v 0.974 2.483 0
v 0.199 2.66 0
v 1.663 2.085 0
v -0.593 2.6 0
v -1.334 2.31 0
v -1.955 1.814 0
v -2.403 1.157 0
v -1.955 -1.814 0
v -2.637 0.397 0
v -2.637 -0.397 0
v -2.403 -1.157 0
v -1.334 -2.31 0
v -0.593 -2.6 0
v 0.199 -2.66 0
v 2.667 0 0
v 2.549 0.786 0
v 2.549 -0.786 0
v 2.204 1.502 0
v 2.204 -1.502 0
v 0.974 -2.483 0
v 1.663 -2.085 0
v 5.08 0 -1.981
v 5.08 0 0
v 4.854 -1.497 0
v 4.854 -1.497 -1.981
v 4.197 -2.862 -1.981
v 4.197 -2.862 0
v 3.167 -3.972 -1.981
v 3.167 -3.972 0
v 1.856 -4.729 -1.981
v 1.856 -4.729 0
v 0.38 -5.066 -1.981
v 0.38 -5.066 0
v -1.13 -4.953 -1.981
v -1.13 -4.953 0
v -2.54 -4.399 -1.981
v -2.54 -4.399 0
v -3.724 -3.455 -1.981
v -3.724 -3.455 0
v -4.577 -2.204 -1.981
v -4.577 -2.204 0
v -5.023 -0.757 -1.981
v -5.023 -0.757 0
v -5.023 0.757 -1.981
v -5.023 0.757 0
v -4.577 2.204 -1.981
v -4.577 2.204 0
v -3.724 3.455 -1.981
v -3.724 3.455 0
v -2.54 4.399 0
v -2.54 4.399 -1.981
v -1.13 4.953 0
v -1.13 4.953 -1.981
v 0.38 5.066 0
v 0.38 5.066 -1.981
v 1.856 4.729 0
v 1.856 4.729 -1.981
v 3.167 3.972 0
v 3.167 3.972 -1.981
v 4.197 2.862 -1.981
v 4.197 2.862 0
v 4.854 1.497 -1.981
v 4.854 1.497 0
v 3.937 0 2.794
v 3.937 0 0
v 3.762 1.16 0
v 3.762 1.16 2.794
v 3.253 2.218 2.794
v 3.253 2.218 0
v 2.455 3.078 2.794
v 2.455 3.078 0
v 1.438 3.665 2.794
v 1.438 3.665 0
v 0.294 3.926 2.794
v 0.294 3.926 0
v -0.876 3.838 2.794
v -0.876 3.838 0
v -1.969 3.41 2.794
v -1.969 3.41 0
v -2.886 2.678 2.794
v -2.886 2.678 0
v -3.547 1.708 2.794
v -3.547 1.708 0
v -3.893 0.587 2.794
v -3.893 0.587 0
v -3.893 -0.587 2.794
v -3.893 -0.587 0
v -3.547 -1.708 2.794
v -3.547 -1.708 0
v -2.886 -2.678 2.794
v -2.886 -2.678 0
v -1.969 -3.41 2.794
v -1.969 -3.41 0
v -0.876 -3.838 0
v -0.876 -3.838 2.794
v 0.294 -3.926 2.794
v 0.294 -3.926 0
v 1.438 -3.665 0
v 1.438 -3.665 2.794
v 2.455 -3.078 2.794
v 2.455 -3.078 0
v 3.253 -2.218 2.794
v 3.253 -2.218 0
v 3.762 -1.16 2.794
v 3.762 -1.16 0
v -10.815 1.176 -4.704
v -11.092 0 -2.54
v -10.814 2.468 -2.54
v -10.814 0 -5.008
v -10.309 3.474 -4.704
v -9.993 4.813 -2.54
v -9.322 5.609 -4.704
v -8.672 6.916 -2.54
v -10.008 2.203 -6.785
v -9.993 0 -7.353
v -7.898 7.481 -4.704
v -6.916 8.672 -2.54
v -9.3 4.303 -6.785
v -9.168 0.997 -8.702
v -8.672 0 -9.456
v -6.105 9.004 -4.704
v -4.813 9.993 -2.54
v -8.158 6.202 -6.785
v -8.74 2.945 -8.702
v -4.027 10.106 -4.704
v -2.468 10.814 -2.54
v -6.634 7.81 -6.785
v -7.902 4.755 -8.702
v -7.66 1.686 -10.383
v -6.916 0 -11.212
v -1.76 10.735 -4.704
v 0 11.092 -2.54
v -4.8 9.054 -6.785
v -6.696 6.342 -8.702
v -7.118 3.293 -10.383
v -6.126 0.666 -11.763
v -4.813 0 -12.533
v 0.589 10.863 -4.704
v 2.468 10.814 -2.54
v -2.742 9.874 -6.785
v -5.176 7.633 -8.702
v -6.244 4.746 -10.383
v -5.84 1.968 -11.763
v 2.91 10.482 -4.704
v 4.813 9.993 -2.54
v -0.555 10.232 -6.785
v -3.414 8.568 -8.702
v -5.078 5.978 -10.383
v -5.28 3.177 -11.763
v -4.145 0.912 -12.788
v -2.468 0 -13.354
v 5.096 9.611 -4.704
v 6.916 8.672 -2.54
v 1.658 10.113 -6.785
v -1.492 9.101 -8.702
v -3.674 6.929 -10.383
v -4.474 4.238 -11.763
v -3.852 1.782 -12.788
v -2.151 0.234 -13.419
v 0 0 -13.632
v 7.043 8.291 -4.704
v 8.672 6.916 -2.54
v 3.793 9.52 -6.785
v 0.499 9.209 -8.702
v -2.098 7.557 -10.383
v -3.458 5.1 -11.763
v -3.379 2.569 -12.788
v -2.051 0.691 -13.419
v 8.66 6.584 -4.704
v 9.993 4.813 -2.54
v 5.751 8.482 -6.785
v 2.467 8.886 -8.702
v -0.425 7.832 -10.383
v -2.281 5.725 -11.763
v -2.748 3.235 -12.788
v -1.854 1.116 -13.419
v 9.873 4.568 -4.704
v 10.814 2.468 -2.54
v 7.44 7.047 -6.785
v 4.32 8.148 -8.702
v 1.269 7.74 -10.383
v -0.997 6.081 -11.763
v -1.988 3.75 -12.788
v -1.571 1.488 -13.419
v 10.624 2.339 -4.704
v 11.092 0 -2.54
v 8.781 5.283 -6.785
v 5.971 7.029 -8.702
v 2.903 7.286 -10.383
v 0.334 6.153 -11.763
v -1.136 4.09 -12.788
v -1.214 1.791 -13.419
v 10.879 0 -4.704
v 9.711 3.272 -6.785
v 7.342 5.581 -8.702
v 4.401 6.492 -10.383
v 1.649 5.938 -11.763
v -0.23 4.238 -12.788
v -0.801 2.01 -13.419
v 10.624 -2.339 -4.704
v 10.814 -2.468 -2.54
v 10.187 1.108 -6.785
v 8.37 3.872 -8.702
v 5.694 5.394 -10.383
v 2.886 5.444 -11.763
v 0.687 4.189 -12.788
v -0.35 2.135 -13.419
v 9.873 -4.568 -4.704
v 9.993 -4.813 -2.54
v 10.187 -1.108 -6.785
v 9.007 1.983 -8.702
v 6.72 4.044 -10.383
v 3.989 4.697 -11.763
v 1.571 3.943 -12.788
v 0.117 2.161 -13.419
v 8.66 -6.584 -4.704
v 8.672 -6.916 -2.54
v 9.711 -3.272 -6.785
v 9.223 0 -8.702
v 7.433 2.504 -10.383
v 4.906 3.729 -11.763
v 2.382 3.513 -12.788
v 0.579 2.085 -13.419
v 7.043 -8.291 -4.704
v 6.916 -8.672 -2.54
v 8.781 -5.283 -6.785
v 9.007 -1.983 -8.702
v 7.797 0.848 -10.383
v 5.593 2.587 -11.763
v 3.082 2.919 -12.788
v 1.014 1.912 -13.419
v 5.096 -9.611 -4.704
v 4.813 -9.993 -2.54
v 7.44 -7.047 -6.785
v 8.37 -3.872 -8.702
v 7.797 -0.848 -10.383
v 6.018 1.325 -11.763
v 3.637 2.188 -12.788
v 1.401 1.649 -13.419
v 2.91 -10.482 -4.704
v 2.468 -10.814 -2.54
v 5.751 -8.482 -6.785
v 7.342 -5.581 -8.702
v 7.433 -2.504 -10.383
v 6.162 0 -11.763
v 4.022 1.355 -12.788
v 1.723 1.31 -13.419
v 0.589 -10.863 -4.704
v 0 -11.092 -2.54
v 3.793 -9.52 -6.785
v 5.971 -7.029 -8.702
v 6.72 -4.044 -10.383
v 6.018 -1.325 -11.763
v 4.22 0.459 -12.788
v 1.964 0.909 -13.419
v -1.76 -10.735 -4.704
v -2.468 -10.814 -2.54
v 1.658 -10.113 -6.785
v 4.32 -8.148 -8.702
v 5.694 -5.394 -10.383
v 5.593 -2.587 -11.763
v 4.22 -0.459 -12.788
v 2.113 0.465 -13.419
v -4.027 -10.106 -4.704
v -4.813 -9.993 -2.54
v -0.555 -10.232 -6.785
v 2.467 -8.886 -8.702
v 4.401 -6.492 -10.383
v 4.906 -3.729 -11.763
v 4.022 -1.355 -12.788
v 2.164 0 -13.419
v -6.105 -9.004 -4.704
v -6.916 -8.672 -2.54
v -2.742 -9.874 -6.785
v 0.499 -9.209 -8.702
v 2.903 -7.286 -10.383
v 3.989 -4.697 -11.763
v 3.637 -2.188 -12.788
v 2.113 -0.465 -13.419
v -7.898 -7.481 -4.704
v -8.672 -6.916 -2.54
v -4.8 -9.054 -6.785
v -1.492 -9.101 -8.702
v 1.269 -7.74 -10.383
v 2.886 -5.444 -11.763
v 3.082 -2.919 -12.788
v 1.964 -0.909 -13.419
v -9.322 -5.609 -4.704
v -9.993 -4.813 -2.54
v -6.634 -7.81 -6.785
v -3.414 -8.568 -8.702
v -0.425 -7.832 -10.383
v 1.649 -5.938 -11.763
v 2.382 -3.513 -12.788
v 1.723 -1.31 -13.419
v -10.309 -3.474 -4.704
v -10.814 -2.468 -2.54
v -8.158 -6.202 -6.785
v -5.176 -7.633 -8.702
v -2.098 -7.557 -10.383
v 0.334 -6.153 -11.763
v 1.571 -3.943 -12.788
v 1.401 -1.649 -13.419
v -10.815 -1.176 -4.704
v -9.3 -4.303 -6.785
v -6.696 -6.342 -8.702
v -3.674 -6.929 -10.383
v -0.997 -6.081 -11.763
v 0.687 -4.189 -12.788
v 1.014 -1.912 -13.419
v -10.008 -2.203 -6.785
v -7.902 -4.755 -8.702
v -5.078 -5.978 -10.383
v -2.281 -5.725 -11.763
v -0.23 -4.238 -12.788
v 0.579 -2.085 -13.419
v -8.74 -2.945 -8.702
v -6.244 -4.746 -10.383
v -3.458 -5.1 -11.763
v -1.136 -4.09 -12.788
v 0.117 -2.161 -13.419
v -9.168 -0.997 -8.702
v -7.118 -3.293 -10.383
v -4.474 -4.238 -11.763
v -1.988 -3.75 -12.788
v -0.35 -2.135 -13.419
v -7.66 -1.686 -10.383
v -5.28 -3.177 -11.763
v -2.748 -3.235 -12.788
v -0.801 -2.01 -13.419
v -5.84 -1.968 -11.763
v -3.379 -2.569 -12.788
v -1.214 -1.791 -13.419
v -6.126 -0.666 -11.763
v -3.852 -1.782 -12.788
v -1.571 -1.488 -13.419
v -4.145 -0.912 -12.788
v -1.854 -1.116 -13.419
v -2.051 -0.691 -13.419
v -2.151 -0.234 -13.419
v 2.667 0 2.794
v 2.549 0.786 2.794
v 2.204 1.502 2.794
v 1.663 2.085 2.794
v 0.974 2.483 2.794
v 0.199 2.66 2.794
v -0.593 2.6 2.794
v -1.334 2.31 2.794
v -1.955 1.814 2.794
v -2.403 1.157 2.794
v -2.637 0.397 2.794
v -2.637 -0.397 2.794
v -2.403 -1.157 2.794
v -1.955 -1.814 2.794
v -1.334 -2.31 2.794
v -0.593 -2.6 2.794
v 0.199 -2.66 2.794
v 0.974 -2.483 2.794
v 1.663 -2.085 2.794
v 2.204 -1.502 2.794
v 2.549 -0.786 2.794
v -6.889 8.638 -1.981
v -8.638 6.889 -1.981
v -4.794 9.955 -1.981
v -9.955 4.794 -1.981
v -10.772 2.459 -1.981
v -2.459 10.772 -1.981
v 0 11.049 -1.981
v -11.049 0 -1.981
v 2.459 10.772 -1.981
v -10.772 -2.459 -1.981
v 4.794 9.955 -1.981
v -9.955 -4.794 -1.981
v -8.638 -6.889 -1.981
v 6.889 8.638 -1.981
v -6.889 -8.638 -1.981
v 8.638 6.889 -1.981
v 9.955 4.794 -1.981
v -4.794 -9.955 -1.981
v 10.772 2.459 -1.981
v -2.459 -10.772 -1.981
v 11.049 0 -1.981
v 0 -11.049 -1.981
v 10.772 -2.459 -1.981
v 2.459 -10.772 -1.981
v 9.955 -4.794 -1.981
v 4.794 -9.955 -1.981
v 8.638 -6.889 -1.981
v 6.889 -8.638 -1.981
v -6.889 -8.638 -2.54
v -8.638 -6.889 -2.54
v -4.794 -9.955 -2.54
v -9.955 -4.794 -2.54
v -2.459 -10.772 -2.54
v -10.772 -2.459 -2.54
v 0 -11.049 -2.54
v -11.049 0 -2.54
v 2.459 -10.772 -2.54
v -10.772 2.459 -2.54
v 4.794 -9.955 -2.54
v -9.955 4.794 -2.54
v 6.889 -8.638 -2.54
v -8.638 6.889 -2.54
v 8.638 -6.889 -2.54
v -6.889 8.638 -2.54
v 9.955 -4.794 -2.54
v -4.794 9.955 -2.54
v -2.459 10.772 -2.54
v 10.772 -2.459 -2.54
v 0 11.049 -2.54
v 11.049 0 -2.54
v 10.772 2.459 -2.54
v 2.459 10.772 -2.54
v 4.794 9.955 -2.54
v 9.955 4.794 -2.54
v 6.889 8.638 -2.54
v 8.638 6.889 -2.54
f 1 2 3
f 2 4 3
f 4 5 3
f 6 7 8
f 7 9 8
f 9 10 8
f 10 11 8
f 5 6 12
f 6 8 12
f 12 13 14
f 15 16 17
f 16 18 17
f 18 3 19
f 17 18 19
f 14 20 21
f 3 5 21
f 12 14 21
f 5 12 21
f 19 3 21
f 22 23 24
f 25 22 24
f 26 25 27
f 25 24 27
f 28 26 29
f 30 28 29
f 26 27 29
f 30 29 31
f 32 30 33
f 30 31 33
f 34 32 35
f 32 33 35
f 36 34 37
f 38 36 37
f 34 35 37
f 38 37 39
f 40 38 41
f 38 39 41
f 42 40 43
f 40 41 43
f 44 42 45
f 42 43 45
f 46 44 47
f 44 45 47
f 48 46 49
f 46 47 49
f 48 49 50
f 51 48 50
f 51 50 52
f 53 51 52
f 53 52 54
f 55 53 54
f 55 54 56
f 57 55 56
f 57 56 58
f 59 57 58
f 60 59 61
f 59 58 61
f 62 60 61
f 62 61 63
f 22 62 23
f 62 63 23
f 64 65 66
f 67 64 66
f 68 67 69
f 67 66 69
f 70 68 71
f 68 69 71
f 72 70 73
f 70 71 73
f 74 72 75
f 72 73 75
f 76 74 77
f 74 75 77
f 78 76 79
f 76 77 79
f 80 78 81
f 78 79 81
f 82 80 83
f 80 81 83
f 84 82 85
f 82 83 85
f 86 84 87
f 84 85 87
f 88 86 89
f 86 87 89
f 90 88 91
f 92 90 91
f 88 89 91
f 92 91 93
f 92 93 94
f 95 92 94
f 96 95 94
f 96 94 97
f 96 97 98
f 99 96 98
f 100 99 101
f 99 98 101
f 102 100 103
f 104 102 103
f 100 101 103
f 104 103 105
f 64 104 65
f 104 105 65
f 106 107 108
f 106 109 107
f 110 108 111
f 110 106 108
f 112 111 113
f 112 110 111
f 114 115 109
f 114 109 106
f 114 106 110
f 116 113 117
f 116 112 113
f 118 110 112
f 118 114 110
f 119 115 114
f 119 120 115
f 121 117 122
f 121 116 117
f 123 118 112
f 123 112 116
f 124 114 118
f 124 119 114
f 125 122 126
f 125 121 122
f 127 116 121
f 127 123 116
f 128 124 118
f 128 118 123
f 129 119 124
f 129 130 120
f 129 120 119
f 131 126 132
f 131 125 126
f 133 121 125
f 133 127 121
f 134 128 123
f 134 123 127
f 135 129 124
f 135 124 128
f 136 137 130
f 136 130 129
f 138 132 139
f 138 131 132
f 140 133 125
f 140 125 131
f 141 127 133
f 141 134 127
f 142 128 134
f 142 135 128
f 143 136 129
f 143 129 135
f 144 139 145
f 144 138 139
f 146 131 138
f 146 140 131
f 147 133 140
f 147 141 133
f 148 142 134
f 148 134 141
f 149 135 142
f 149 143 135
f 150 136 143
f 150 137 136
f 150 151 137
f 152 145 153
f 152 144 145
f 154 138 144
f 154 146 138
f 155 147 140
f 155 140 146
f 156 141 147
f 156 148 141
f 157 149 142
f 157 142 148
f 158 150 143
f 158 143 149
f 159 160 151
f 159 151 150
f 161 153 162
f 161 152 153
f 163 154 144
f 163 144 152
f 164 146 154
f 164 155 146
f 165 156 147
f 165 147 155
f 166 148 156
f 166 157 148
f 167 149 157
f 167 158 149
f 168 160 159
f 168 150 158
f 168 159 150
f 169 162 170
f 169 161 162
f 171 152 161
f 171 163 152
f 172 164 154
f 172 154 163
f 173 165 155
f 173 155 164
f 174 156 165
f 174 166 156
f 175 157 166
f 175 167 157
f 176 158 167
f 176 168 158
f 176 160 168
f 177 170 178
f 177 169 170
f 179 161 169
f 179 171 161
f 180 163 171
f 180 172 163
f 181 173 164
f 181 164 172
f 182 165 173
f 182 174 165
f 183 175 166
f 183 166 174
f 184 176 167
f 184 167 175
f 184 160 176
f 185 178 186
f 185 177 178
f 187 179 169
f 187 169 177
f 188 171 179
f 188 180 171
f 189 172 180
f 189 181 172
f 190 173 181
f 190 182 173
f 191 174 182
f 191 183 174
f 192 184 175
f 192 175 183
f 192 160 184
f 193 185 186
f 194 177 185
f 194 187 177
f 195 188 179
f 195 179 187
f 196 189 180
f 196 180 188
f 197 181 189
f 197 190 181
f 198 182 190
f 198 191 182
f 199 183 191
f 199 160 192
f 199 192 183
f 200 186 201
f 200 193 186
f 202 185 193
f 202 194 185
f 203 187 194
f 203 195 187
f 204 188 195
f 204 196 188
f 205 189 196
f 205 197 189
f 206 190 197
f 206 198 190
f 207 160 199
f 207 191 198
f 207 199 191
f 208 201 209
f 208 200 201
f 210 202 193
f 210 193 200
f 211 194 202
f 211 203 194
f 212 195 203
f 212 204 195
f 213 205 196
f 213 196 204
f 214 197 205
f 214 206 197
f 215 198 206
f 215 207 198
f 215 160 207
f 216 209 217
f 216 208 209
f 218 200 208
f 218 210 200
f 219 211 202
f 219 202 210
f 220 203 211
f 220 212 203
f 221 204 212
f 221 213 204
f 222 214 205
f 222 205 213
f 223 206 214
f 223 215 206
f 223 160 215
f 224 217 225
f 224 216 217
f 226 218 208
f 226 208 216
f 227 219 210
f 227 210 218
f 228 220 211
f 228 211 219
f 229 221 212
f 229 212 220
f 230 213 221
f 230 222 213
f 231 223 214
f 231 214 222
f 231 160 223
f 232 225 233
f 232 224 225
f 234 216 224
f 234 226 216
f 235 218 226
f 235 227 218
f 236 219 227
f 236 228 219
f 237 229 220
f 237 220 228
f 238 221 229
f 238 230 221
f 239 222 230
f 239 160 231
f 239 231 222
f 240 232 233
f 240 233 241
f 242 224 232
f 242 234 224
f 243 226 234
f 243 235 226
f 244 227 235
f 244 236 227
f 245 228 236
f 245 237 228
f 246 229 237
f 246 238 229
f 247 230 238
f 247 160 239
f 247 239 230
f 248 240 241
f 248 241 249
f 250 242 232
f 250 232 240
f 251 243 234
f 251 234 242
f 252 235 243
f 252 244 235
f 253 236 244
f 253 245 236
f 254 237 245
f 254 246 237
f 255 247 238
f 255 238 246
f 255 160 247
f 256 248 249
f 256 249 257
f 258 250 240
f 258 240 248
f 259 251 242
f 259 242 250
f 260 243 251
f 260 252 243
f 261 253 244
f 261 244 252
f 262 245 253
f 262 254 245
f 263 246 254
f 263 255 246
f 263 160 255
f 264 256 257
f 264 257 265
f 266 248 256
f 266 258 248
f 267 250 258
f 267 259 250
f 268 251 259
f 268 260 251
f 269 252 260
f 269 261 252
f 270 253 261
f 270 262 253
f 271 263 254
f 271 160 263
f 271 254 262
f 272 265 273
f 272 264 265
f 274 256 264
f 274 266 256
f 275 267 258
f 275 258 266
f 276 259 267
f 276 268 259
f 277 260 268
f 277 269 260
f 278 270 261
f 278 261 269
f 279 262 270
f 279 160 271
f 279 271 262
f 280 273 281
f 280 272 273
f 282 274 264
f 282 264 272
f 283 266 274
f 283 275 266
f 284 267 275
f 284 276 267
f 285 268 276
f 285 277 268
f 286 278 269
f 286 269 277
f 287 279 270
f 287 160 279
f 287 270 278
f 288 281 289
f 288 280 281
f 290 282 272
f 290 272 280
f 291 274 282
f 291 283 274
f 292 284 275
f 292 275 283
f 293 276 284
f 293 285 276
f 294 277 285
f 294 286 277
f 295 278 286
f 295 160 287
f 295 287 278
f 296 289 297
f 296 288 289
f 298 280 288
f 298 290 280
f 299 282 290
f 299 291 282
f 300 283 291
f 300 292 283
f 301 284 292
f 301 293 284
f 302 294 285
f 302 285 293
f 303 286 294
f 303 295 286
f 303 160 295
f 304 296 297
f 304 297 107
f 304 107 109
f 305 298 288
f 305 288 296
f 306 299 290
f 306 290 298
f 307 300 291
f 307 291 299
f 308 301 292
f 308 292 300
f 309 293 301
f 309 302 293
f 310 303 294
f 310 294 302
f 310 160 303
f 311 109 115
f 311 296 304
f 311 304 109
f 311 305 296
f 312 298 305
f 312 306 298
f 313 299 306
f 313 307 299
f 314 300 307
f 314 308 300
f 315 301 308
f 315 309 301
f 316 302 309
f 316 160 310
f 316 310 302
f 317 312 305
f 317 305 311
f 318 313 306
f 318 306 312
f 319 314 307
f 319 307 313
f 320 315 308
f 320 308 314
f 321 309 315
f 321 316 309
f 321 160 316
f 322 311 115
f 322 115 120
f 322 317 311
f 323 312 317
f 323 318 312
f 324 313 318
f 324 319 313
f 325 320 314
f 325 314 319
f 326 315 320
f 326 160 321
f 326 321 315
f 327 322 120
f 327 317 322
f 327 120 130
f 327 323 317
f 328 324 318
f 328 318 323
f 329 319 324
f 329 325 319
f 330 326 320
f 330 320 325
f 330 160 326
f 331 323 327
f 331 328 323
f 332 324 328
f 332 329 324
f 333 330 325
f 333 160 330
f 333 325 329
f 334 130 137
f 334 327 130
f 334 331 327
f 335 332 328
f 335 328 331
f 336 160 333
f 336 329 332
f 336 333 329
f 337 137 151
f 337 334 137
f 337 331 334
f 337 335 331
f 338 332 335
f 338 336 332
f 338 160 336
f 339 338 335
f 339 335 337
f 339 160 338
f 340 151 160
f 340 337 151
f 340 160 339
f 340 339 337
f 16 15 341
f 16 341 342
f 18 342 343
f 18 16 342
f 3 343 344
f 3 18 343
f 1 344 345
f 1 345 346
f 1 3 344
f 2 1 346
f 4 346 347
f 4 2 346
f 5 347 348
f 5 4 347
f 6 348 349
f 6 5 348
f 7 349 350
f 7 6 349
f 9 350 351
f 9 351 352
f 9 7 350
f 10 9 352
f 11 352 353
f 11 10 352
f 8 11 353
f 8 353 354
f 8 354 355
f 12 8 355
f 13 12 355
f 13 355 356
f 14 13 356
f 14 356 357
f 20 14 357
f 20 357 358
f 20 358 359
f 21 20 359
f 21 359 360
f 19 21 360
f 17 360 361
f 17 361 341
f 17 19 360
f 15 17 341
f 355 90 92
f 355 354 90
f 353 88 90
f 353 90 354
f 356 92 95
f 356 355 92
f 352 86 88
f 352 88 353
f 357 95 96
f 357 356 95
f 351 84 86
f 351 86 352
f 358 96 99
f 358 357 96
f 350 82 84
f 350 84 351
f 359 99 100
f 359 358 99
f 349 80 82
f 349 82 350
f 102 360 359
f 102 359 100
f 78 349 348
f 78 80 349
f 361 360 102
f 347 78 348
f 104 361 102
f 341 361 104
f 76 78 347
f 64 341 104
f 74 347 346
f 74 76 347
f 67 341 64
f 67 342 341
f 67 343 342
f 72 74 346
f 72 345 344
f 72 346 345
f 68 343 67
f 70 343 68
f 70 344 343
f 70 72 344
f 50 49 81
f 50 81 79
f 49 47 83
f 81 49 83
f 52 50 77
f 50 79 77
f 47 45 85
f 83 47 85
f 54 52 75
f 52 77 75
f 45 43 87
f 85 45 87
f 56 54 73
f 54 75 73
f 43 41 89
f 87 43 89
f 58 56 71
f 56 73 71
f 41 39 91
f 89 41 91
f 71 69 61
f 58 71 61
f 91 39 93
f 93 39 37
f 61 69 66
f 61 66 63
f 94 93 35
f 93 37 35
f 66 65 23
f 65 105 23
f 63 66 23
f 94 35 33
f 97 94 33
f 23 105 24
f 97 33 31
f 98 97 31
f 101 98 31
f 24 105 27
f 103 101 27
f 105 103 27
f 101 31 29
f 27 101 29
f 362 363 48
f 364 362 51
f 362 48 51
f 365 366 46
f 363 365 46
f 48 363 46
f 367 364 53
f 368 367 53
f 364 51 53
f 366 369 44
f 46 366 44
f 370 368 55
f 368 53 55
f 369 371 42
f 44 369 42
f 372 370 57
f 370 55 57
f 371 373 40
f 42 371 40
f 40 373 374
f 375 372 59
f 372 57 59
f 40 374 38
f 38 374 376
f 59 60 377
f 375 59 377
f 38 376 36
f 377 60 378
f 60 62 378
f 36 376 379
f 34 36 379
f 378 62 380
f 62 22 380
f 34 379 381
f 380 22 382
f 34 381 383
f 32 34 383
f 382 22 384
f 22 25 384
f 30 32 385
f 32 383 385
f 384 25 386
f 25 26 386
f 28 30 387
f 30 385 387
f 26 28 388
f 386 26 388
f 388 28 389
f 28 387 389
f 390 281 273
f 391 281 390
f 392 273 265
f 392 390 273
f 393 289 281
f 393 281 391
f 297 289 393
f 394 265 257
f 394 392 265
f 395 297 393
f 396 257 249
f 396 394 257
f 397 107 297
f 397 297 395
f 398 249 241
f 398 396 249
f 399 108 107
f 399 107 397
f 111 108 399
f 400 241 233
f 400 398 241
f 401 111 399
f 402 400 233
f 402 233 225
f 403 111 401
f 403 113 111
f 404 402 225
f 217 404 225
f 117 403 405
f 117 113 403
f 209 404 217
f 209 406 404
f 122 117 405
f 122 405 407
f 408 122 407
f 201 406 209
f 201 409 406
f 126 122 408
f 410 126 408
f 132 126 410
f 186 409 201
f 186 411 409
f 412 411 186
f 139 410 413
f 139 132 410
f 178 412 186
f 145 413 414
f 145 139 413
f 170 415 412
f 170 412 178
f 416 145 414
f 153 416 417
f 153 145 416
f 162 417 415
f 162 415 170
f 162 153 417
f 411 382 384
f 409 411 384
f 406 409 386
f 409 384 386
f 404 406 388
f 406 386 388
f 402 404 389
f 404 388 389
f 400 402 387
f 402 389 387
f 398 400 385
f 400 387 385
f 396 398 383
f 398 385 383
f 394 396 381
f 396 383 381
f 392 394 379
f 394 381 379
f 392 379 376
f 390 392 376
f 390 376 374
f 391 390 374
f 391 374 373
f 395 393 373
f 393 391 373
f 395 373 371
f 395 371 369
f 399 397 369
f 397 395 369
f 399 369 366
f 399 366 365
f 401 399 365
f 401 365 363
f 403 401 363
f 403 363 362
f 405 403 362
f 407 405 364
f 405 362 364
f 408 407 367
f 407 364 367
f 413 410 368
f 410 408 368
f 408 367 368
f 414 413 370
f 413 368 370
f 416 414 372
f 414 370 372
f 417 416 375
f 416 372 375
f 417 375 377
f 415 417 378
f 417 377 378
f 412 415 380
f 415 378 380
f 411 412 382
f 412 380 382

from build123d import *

# Parameters (mm, degrees)
F0_R     = 3.937
F0_R_2   = 2.667
F1_DEPTH = 2.794
F2_R     = 5.08
F3_DEPTH = 1.9812
F4_R     = 11.049
F5_DEPTH = 1.524


# Not quite as in the source:
# - a feature names something its author has since deleted; it is built from what else it names


with BuildPart() as f1:
    # F0 (on Top) → F1 (new body)
    with BuildSketch(Plane.XY):
        Circle(F0_R)
        Circle(F0_R_2, mode=Mode.SUBTRACT)
    extrude(amount=F1_DEPTH)

    # F2 (on face) → F3 (join)
    with BuildSketch(Plane(origin=(0, 0, 0), x_dir=(1, 0, 0), z_dir=(0, 0, -1))):
        Circle(F2_R)
    extrude(amount=F3_DEPTH)

    # F4 (on face) → F5 (join)
    with BuildSketch(Plane(origin=(0, 0, -1.9812), x_dir=(1, 0, 0), z_dir=(0, 0, -1))):
        Circle(F4_R)
    extrude(amount=F5_DEPTH)

    # F6 (on Front) → F7 (revolve)
    with BuildSketch(Plane.XZ):
        with BuildLine():
            Line((0, -2.54), (-11.09184091, -2.54))
            ThreePointArc((-11.09184091, -2.54), (-7.8431159233, -10.3831159233), (0, -13.63184091))
            Line((0, -13.63184091), (0, -3.5557490773))
            Line((0, -3.5557490773), (0, -2.54))
        make_face()
    revolve(axis=Axis((0, 0, -8.5937949937), (0, 0, -1)))


solid = f1.part
